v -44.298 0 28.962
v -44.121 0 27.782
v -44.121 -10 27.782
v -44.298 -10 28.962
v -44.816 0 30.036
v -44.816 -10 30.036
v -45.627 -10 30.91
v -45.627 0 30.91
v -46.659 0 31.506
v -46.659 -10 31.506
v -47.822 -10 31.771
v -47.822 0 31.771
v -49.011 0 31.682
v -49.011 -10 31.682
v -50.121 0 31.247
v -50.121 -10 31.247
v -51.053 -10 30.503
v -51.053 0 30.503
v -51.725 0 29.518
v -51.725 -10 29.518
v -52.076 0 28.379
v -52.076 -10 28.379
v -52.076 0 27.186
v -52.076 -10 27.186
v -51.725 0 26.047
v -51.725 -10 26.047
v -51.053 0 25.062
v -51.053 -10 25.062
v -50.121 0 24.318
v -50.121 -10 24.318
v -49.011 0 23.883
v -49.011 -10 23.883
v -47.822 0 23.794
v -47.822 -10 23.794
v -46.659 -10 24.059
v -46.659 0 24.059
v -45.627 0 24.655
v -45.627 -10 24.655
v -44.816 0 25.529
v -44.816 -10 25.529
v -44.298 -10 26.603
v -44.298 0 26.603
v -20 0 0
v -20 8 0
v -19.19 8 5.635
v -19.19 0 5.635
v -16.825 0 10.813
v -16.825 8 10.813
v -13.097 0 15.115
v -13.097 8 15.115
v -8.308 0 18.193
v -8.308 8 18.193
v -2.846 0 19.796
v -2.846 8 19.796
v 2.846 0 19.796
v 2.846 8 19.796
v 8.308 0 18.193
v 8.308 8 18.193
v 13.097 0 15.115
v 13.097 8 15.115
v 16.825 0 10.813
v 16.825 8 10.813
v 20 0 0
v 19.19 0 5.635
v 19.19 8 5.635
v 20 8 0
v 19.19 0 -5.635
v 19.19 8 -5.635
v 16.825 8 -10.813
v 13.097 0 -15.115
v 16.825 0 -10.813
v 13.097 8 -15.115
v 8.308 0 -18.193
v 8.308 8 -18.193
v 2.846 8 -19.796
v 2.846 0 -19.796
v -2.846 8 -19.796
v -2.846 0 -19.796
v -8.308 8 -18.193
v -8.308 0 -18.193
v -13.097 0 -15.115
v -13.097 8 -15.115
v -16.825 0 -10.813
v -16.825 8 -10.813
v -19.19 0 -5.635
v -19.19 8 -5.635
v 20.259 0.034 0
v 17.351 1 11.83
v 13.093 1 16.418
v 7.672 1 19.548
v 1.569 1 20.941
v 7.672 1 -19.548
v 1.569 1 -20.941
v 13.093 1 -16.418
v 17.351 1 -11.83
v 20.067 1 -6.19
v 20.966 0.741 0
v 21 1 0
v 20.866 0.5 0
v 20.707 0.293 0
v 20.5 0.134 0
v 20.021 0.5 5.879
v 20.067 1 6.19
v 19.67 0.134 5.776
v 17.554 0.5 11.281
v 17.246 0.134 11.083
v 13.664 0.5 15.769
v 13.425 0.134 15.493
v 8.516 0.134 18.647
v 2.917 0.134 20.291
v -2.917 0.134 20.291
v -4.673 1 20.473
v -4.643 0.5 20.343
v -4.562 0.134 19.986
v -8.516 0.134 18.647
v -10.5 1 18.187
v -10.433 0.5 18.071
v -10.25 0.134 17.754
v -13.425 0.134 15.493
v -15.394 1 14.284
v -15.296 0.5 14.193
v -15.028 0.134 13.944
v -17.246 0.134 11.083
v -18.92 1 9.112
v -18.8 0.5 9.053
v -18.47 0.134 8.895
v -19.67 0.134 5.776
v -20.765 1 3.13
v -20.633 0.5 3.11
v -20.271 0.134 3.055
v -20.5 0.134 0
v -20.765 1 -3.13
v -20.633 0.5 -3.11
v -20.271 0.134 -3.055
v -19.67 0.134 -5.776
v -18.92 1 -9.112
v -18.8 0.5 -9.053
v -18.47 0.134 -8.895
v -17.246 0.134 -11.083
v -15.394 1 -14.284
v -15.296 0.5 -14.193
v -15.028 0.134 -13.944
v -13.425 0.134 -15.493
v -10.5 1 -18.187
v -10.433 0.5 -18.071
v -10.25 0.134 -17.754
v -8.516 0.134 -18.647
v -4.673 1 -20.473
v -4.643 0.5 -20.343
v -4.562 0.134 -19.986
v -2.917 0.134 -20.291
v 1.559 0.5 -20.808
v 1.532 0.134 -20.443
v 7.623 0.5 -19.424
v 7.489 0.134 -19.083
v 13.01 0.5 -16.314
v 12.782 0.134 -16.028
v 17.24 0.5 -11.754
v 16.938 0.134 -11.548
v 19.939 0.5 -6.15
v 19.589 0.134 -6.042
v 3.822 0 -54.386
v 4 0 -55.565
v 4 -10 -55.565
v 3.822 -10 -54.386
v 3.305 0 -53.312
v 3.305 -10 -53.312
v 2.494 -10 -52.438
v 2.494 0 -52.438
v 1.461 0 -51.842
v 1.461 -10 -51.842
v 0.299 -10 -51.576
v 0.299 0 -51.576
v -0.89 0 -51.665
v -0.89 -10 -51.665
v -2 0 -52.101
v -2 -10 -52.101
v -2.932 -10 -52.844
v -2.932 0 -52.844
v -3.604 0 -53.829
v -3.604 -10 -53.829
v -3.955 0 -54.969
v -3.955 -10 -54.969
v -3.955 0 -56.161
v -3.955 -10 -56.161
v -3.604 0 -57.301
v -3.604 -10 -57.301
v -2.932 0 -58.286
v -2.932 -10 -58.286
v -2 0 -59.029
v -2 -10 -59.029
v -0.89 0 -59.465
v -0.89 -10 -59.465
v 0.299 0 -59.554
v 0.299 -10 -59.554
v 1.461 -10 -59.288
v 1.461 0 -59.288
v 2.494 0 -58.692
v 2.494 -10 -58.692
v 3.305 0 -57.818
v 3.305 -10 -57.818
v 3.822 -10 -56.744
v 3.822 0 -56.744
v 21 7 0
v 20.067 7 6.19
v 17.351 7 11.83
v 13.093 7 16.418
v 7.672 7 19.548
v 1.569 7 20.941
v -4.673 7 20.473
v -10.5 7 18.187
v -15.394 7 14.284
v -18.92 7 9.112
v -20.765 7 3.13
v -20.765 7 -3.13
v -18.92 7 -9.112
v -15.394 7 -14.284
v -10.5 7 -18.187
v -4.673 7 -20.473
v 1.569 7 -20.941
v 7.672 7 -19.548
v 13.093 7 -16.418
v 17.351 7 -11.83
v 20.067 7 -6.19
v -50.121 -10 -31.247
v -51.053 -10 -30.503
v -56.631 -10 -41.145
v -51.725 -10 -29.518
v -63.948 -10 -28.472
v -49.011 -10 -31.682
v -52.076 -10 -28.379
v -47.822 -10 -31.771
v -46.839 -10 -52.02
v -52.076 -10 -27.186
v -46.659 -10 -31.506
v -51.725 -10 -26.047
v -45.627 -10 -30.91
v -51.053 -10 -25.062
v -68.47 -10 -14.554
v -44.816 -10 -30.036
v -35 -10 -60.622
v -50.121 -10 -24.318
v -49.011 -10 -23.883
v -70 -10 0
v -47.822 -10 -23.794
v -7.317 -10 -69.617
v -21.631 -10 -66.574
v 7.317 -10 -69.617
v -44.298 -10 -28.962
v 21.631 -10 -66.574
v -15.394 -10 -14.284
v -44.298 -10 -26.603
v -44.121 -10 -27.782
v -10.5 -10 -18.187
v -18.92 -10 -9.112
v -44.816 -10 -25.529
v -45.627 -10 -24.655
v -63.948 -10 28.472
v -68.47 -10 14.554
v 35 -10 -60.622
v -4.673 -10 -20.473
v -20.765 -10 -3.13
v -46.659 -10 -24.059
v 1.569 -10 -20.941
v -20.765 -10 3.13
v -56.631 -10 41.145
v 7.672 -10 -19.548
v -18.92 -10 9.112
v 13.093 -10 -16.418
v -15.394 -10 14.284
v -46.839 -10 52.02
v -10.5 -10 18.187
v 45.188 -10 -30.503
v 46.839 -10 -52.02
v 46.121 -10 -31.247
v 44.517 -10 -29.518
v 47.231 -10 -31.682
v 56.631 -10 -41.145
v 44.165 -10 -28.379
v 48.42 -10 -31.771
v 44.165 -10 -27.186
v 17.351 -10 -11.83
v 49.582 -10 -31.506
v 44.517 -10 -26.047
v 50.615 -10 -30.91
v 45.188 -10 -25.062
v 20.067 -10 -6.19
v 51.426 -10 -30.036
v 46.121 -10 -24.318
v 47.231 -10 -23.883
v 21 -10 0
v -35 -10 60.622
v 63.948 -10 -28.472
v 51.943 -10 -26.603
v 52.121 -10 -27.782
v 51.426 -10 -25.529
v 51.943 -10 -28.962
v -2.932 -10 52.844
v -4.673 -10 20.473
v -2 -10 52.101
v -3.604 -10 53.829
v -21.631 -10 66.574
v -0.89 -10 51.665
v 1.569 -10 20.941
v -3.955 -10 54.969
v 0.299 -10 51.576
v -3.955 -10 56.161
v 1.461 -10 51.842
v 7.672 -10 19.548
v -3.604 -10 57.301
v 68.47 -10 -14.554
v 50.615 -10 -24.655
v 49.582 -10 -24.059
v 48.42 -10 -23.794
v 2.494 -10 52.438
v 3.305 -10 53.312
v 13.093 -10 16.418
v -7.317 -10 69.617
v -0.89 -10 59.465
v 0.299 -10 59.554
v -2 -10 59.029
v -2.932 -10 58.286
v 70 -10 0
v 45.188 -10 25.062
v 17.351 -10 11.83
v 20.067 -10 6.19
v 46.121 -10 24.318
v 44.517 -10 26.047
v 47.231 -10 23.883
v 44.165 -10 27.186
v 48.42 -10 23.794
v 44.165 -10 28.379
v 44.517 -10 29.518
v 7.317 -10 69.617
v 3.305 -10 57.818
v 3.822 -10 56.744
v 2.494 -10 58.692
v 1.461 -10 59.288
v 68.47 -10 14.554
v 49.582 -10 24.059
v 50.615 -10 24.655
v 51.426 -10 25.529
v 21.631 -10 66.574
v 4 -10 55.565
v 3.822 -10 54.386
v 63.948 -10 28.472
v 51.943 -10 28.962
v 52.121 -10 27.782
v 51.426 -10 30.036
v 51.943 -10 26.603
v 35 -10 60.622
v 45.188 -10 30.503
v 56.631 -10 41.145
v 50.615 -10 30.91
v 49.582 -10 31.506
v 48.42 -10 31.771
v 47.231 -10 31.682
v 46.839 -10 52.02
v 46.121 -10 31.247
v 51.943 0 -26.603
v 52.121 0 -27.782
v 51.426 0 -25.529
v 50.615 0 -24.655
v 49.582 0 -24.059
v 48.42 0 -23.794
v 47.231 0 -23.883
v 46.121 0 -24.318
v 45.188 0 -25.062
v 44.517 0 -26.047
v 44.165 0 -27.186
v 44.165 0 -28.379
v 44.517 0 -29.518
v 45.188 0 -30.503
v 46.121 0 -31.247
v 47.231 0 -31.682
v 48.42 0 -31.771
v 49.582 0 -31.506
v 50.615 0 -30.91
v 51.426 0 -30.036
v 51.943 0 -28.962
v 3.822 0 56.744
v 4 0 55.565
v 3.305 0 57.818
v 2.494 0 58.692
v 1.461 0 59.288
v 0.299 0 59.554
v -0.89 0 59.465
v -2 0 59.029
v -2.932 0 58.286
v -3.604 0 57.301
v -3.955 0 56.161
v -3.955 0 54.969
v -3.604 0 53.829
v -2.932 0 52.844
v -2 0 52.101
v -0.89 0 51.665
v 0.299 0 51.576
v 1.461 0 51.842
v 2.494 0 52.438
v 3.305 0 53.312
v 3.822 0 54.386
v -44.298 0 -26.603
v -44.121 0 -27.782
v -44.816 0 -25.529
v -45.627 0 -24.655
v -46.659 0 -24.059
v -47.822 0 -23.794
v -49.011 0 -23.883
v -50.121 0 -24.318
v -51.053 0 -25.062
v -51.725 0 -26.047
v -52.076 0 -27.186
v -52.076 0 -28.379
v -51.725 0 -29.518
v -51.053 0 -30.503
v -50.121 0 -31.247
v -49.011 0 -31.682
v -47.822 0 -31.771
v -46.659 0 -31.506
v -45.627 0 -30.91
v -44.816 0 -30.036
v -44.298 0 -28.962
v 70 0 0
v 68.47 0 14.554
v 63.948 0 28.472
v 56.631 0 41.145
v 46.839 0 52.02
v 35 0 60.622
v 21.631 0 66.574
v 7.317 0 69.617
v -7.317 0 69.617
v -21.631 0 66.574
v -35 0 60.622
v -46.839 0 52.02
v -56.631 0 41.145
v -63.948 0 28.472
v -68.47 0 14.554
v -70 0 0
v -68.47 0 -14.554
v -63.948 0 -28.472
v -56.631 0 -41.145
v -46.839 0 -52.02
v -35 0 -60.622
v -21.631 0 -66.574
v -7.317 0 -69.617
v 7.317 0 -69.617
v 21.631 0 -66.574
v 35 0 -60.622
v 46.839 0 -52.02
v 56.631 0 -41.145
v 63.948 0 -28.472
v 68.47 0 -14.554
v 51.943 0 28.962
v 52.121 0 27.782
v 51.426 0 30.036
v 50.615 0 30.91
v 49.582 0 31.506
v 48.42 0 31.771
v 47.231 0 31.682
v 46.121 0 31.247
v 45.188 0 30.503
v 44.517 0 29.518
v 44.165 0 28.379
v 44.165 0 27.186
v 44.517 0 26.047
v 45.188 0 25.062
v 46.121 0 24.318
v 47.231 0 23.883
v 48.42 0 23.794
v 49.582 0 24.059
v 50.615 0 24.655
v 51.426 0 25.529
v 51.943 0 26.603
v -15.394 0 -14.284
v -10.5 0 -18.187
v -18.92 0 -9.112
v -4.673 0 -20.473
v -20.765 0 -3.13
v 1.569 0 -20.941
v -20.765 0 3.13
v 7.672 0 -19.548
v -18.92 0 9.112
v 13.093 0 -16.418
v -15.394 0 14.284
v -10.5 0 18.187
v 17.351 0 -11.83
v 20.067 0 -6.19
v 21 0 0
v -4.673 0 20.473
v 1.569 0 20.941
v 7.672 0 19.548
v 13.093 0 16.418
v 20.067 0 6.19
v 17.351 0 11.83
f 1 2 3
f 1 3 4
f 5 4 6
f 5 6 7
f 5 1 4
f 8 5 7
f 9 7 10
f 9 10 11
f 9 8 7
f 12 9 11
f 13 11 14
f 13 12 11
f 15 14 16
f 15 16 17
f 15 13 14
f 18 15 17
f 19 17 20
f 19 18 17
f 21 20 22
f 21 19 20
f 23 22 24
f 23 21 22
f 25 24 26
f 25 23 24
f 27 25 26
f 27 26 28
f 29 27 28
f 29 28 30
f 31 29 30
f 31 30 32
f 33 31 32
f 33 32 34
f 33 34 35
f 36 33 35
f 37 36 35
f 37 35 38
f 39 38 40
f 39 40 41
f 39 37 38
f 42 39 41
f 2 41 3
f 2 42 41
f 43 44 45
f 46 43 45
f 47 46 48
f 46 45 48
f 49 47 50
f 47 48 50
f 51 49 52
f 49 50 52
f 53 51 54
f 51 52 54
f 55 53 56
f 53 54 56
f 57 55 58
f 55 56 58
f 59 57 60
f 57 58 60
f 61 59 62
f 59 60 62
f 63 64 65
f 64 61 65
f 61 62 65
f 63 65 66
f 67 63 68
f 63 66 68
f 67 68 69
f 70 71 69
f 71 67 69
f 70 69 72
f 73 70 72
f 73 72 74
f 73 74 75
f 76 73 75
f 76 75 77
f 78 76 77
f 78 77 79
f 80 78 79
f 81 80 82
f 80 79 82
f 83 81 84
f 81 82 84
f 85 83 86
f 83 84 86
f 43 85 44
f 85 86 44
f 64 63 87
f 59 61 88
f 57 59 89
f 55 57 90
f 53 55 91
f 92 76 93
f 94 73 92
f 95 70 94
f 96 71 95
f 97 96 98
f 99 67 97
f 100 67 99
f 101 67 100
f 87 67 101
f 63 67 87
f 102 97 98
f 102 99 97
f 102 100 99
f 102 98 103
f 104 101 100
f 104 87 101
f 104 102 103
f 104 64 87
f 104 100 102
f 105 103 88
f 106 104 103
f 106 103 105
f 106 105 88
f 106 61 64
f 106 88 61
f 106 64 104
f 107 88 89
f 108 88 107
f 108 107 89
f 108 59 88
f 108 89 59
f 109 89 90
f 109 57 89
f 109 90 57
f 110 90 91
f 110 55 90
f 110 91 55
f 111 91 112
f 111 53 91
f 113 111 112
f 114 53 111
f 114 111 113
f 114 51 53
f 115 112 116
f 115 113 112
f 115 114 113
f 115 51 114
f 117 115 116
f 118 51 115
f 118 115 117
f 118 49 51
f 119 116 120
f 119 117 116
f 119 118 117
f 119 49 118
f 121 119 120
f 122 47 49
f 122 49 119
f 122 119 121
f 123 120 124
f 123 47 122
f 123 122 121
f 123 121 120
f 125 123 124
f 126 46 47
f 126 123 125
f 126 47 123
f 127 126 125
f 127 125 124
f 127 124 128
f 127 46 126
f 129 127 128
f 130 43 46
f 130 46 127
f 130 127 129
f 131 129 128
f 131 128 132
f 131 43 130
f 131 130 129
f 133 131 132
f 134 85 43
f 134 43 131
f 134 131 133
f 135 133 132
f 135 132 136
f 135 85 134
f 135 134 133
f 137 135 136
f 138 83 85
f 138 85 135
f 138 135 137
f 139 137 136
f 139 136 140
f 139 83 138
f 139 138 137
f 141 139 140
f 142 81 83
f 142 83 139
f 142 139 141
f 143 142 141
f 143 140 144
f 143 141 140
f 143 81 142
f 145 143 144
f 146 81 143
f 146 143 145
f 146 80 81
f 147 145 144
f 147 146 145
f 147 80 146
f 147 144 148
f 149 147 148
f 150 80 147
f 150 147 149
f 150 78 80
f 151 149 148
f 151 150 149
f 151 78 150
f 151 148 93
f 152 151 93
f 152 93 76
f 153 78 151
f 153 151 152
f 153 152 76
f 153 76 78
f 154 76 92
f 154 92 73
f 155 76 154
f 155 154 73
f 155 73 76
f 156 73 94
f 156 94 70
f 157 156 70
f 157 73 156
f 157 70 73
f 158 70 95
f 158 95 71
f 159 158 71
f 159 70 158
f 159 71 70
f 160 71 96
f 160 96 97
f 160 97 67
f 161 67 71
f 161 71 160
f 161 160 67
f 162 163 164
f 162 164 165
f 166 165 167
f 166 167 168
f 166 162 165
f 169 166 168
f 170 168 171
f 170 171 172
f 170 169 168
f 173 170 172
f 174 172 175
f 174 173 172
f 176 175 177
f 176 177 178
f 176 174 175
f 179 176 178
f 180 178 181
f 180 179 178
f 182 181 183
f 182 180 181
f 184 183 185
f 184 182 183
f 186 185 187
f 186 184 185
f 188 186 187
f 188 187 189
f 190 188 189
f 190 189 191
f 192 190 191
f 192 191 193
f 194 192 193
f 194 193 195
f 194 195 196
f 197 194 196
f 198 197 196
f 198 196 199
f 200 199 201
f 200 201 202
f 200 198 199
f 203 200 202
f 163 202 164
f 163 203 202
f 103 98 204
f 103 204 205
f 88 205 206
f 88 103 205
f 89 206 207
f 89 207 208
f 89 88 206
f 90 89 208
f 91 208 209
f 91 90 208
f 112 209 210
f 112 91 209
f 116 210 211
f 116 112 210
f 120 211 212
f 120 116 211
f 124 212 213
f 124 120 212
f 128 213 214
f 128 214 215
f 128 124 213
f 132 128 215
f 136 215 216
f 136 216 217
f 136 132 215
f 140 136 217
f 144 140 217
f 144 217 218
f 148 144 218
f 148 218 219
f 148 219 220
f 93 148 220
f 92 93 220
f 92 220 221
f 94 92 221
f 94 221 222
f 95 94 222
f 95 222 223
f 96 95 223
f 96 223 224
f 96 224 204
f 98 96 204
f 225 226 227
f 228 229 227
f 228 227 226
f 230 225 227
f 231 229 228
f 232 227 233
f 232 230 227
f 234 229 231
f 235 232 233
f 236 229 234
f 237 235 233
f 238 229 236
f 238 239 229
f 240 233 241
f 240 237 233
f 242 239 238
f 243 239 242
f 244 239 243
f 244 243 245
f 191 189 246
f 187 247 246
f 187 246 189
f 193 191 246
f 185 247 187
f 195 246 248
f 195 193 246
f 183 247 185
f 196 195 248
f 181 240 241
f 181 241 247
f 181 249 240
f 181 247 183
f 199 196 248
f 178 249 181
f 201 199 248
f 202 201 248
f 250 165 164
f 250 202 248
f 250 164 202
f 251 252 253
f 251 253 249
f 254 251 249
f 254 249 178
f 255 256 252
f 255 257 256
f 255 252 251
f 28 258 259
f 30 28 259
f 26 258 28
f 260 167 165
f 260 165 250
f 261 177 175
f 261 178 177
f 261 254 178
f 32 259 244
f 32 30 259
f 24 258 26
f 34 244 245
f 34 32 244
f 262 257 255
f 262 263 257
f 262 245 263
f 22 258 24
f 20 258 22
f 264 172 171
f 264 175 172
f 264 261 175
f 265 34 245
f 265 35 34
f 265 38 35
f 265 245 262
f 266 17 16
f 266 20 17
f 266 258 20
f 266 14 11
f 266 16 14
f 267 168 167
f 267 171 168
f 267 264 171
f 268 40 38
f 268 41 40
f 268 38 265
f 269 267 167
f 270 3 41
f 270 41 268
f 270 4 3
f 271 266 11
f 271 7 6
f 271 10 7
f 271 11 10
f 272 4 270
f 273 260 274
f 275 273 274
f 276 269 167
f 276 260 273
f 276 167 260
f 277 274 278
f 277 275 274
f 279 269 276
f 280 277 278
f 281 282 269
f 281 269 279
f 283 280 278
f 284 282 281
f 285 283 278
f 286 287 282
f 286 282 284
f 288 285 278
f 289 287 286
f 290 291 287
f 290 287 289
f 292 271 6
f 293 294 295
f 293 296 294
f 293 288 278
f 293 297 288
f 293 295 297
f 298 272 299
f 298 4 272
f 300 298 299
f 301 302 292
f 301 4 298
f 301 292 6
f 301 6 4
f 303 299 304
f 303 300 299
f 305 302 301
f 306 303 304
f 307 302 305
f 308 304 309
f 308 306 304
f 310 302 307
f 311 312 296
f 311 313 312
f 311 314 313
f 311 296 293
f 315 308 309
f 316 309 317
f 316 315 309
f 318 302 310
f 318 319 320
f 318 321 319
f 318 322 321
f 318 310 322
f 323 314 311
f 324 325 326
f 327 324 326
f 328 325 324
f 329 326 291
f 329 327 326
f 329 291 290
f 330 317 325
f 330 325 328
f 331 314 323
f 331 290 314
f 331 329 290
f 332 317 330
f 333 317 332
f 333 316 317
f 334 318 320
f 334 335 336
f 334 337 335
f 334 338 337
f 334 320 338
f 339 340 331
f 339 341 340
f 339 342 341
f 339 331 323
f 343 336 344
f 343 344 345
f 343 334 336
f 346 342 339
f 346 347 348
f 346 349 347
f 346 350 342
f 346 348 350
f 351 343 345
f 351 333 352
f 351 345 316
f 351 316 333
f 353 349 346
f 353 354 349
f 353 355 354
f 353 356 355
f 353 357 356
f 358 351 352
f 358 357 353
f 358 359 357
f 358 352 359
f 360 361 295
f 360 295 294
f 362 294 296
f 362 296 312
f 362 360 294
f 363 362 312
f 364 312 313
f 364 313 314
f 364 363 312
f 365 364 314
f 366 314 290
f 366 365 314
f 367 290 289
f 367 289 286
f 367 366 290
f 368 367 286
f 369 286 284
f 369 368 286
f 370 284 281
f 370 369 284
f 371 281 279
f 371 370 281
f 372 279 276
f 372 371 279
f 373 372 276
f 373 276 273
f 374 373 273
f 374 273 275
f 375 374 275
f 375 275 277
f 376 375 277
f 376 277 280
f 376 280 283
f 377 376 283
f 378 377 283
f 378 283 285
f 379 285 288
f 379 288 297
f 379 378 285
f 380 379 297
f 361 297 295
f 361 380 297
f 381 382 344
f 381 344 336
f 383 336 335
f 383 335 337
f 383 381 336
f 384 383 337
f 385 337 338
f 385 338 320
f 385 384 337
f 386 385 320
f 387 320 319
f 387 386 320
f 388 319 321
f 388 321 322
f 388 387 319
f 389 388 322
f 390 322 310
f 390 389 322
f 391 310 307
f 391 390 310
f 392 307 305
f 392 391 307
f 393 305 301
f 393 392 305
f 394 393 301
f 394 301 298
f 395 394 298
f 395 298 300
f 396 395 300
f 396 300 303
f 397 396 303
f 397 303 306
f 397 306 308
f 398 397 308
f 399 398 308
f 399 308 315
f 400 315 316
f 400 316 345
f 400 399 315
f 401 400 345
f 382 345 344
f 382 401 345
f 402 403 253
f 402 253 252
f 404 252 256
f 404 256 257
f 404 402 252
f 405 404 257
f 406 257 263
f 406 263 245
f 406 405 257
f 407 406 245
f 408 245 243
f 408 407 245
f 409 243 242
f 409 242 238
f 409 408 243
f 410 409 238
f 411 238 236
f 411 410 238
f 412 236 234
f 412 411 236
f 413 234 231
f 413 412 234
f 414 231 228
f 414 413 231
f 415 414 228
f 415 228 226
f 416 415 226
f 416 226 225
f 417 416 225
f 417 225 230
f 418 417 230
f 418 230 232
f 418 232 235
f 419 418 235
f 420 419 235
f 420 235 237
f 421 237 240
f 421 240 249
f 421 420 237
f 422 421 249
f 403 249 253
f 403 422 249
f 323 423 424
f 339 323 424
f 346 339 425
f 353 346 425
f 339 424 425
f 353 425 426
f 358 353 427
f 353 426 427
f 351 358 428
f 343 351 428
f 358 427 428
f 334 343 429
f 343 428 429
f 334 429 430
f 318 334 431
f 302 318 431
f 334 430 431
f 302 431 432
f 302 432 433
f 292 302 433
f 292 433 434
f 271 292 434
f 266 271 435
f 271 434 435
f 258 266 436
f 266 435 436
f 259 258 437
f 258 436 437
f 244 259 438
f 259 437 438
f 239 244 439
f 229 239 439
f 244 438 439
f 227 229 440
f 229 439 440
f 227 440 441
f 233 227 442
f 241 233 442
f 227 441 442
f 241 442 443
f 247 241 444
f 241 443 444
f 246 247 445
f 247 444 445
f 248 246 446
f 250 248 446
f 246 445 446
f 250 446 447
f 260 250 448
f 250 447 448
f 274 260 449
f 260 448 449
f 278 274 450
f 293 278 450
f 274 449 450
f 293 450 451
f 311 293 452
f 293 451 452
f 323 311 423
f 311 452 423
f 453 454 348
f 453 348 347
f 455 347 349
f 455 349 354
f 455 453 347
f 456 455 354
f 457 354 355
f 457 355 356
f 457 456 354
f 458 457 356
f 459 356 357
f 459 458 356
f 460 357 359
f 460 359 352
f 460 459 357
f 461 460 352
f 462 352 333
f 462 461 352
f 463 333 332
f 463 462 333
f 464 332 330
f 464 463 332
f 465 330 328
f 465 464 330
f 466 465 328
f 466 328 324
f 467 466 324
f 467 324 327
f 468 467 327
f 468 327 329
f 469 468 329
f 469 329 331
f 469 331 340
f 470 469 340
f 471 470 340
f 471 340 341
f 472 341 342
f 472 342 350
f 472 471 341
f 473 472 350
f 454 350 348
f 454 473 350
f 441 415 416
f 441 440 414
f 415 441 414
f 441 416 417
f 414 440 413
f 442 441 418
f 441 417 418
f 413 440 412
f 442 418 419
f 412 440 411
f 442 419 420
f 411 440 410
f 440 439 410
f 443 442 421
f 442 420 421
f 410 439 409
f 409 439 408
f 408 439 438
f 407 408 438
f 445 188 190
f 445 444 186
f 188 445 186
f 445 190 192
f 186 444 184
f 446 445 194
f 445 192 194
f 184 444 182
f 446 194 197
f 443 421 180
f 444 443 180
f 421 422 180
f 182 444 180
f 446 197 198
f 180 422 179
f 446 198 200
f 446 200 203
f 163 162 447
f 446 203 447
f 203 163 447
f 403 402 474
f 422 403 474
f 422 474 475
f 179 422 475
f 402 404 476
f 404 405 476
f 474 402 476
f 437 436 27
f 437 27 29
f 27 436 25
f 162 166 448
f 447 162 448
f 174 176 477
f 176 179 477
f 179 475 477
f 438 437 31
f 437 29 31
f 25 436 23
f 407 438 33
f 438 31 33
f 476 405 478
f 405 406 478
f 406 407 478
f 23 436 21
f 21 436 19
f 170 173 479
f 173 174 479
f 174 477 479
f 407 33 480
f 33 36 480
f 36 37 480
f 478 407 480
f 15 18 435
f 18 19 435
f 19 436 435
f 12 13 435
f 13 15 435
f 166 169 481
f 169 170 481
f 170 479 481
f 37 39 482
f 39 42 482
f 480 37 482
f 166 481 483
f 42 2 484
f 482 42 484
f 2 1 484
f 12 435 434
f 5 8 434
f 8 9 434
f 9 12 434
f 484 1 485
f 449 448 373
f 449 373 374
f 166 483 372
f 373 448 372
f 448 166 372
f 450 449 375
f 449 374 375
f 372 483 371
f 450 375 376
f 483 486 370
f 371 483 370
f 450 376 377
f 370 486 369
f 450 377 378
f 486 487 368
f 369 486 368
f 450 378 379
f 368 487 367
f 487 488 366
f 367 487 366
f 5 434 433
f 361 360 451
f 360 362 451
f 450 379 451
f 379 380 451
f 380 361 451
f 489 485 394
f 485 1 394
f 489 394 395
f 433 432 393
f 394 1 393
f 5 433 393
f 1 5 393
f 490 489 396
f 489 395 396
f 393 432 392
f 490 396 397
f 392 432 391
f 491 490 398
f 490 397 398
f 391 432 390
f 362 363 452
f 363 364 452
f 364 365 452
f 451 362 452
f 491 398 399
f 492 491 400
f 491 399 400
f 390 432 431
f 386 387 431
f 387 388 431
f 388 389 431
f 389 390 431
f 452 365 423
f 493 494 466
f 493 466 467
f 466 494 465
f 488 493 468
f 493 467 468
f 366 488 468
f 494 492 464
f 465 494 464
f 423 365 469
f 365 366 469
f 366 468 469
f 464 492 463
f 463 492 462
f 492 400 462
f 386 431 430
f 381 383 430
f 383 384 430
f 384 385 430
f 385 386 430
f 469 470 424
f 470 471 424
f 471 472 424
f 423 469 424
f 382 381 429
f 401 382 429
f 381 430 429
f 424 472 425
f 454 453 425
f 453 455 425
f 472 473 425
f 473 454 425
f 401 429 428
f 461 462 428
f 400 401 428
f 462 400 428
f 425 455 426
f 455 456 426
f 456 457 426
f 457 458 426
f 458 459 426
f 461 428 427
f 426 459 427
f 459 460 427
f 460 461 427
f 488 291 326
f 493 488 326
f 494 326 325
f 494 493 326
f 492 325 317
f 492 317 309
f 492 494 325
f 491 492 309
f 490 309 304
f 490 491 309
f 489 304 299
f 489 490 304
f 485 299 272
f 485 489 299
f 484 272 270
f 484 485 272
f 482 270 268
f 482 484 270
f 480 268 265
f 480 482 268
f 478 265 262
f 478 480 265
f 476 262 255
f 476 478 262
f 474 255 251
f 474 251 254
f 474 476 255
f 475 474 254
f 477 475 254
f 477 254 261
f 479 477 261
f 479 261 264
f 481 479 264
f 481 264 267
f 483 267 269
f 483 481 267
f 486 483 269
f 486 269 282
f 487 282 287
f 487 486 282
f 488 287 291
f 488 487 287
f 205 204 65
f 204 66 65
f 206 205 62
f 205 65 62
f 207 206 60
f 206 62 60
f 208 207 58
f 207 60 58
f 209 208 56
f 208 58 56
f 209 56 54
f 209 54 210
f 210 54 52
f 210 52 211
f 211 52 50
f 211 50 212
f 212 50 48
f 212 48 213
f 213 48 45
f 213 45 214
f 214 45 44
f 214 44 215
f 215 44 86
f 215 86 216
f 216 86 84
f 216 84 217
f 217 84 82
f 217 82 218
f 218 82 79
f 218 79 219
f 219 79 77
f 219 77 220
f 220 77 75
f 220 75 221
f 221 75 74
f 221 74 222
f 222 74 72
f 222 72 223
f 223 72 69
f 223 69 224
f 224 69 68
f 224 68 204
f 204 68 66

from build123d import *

# Parameters (mm, degrees)
F0_R     = 70
F0_R_2   = 4
F0_R_3   = 21
F1_DEPTH = 10
F2_R     = 21
F3_DEPTH = 8
F4_SIZE  = 1
F6_R     = 20
F7_DEPTH = 20


# Not quite as in the source:
# - a fillet or chamfer that OpenCascade refuses, or shapes differently, is made with other operations: its cross-section is extruded or revolved along the edge and cut away or added


with BuildPart() as f1:
    # F0 (on Front) → F1 (new body)
    with BuildSketch(Plane.XZ):
        Circle(F0_R)
        with Locations((-48.1207015613, -27.7825)):
            Circle(F0_R_2, mode=Mode.SUBTRACT)
        with Locations((0, -55.565)):
            Circle(F0_R_2, mode=Mode.SUBTRACT)
        with Locations((48.1207015613, -27.7825)):
            Circle(F0_R_2, mode=Mode.SUBTRACT)
        with Locations((-48.1207015613, 27.7825)):
            Circle(F0_R_2, mode=Mode.SUBTRACT)
        Circle(F0_R_3, mode=Mode.SUBTRACT)
        with Locations((48.1207015613, 27.7825)):
            Circle(F0_R_2, mode=Mode.SUBTRACT)
        with Locations((0, 55.565)):
            Circle(F0_R_2, mode=Mode.SUBTRACT)
    extrude(amount=F1_DEPTH)

    # F2 (on Front) → F3 (join)
    with BuildSketch(Plane.XZ):
        Circle(F2_R)
    extrude(amount=-F3_DEPTH)

    # F4
    f4_edges = [f1.edges().sort_by_distance(p)[0] for p in [
        (-21, 8, 0),
    ]]
    chamfer(f4_edges, length=F4_SIZE)

    # F5: fillet of radius 1 on 1 edges, made by hand

    # F5_s1 → F5_t2 (revolve, cut)
    with BuildSketch(Plane.XY):
        with BuildLine():
            ThreePointArc((21, 1), (20.7071067812, 0.2928932188), (20, 0))
            Line((20, 0), (21, 0))
            Line((21, 0), (21, 1))
        make_face()
    revolve(axis=Axis((0, 0, 0), (0, -1, 0)), mode=Mode.SUBTRACT)

    # F6 (on face) → F7 (cut)
    with BuildSketch(Plane(origin=(0, 8, 0), x_dir=(-1, 0, 0), z_dir=(0, 1, 0))):
        Circle(F6_R)
    extrude(amount=-F7_DEPTH, mode=Mode.SUBTRACT)


solid = f1.part
